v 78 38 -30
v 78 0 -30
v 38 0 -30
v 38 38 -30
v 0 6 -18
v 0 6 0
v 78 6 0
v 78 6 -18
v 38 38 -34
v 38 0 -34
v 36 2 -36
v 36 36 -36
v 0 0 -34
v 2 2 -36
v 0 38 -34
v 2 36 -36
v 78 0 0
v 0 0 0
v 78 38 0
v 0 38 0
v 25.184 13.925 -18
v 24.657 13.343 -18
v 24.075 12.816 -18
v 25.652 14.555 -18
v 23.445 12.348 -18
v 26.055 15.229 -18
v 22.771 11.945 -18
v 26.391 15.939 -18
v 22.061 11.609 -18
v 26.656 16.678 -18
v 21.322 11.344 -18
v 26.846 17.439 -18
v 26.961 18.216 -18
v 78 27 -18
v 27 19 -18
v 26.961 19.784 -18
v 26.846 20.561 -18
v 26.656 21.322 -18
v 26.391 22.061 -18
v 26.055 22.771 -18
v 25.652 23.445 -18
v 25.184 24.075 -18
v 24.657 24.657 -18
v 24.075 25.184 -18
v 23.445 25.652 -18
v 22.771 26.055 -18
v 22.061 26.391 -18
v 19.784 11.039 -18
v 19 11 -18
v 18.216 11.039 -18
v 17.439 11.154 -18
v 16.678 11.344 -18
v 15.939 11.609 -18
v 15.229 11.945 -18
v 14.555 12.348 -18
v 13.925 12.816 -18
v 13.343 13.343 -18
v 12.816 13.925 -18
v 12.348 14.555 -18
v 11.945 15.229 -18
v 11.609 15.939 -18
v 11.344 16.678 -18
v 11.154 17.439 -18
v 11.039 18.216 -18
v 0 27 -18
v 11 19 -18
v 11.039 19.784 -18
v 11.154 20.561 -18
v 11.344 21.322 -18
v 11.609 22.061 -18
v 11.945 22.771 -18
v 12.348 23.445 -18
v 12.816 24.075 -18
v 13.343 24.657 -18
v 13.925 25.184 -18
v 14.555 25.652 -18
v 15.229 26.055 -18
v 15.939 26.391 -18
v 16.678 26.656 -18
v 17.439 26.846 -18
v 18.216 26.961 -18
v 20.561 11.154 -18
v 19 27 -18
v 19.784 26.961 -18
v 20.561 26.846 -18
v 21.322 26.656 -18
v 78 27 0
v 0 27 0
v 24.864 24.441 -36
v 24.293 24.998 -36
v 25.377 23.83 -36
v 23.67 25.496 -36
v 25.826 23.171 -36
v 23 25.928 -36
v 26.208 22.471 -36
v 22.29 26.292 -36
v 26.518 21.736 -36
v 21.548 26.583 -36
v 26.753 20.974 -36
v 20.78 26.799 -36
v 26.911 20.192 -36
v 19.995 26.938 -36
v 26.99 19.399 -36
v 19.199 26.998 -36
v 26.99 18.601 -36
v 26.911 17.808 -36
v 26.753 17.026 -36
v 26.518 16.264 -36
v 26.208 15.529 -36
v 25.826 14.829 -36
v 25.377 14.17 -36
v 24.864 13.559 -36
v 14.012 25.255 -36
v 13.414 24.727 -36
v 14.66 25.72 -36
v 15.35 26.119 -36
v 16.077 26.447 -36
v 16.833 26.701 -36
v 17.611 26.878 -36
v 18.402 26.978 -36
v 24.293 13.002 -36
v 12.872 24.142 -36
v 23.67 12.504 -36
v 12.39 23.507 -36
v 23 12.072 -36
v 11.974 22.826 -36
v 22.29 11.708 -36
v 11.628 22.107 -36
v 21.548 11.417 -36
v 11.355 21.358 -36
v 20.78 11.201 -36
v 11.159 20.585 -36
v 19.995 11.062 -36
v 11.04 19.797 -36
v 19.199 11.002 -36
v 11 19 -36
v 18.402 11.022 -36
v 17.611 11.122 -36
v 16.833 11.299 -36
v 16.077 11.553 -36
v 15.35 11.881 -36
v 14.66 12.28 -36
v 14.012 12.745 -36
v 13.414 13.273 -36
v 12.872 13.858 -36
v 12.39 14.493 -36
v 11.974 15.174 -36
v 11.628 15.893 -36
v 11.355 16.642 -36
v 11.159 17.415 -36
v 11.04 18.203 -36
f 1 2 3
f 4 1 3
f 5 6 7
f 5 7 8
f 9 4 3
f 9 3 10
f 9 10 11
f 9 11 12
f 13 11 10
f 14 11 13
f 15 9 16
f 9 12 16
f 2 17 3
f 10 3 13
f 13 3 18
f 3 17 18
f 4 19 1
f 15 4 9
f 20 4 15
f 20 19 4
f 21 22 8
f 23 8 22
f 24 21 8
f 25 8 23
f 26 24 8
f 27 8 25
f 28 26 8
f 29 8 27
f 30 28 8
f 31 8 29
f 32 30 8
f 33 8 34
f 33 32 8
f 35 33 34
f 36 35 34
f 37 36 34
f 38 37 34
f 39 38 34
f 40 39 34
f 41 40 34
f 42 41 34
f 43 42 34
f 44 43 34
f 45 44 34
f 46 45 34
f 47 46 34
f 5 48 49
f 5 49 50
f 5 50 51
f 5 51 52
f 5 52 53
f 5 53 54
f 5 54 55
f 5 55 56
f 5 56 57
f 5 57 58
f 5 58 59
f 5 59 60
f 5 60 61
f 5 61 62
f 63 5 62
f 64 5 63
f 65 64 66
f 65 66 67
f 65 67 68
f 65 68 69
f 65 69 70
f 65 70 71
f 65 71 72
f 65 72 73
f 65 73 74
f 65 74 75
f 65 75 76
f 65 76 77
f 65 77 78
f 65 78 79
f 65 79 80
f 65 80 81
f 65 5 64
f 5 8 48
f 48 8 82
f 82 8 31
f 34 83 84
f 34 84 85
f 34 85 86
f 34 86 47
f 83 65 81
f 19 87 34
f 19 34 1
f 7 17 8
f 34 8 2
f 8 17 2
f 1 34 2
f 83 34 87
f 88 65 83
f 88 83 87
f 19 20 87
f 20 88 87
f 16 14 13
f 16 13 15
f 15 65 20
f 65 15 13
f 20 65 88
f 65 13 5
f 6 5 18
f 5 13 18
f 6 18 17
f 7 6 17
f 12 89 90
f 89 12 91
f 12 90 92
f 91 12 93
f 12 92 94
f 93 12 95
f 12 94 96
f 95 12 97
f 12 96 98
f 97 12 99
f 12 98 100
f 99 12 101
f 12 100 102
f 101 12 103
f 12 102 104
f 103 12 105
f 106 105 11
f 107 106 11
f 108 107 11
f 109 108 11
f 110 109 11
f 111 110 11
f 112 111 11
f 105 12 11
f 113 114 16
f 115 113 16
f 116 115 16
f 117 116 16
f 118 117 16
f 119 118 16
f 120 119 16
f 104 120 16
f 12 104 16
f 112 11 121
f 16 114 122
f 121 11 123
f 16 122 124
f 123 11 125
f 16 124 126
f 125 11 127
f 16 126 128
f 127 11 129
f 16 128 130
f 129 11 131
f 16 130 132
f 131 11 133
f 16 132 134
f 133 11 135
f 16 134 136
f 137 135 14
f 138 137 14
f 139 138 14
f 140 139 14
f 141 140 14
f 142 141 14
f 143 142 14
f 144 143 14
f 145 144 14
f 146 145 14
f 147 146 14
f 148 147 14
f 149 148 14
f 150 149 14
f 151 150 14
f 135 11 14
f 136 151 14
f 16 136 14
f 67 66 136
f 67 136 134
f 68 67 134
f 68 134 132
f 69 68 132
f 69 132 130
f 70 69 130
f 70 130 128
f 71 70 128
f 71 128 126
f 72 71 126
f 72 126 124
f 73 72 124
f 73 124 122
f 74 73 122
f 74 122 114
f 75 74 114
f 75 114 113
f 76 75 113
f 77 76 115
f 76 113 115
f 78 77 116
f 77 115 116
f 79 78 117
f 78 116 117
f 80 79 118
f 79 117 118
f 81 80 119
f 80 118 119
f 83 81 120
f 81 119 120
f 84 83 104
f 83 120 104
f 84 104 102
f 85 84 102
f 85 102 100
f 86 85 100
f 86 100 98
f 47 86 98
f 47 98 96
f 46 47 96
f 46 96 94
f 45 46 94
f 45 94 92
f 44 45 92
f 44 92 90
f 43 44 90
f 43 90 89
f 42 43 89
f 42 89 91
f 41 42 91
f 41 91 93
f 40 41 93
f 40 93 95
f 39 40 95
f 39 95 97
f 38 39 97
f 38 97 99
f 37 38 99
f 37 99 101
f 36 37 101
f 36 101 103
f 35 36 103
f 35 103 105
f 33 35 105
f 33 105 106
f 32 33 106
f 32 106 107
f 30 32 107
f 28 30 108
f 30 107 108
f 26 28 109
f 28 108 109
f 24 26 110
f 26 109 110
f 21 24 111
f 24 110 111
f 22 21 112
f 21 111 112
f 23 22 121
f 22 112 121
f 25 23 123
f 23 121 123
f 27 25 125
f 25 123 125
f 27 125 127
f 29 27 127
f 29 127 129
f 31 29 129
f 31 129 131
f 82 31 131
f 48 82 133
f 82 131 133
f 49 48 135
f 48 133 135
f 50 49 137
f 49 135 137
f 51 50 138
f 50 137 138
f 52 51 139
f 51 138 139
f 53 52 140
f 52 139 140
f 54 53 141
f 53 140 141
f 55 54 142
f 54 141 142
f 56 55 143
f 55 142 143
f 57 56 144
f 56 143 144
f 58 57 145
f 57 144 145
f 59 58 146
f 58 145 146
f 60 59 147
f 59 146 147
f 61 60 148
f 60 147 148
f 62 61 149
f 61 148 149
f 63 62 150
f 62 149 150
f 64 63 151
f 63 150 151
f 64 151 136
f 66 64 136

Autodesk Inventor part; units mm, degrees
ref_plane "YZ Plane" through (0, 0, 0) normal (1, 0, 0) x (0, 1, 0)
ref_plane "XZ Plane" through (0, 0, 0) normal (0, 1, 0) x (-1, 0, 0)
ref_plane "XY Plane" through (0, 0, 0) normal (0, 0, 1) x (1, 0, 0)
sketch "Boceto2" plane through (0, 0, 0) normal (0, 1, 0) x (-1, 0, 0)
  line L0 (0, 0) -> (-78, 0)
  line L1 (-78, 0) -> (-78, -30)
  line L2 (-78, -30) -> (-38, -30)
  line L3 (-38, -30) -> (-38, -36)
  line L4 (-38, -36) -> (0, -36)
  line L5 (0, -36) -> (0, 0)
  dimension "d2" = 78
  dimension "d3" = 36
  dimension "d4" = 30
  dimension "d5" = 38
extrude "Extrusión1" add sketch "Boceto2" along normal blind 38
sketch "Boceto3" plane through (0, 0, -36) normal (-1, 0, 0) x (0, 0, 1)
  line L0 (0, 0) -> (36, 0) construction
  line L1 (36, 0) -> (36, 6) construction
  line L2 (36, 0) -> (36, 38) construction
  line L3 (36, 6) -> (36, 27) construction
  line L4 (36, 27) -> (36, 38) construction
  line L5 (36, 6) -> (18, 6)
  line L6 (18, 6) -> (18, 27)
  line L7 (18, 27) -> (36, 27)
  line L8 (36, 6) -> (36, 27)
  dimension "d8" = 6
  dimension "d9" = 21
  dimension "d10" = 38
  dimension "d11" = 18
extrude "Extrusión2" cut sketch "Boceto3" against normal through all
sketch "Boceto4" plane through (38, 0, -36) normal (0, 0, -1) x (-1, 0, 0)
  line L0 (38, 27) -> (38, 38) construction
  line L1 (38, 38) -> (38, 19) construction
  line L2 (38, 19) -> (19, 19) construction
  line L3 (0, 0) -> (0, 38) construction
  circle A0 centre (19, 19) radius 8
  point P0 (38, 0)
  dimension "d14" = 19
  dimension "d15" = 19
  dimension "d16" = 16
extrude "Extrusión3" cut sketch "Boceto4" against normal through all
chamfer "Chaflán1" distance 2 angle 45 4 edges at (19, 38, -36) (0, 19, -36) (19, 0, -36) (38, 19, -36)
properties part number "Practica 6"
